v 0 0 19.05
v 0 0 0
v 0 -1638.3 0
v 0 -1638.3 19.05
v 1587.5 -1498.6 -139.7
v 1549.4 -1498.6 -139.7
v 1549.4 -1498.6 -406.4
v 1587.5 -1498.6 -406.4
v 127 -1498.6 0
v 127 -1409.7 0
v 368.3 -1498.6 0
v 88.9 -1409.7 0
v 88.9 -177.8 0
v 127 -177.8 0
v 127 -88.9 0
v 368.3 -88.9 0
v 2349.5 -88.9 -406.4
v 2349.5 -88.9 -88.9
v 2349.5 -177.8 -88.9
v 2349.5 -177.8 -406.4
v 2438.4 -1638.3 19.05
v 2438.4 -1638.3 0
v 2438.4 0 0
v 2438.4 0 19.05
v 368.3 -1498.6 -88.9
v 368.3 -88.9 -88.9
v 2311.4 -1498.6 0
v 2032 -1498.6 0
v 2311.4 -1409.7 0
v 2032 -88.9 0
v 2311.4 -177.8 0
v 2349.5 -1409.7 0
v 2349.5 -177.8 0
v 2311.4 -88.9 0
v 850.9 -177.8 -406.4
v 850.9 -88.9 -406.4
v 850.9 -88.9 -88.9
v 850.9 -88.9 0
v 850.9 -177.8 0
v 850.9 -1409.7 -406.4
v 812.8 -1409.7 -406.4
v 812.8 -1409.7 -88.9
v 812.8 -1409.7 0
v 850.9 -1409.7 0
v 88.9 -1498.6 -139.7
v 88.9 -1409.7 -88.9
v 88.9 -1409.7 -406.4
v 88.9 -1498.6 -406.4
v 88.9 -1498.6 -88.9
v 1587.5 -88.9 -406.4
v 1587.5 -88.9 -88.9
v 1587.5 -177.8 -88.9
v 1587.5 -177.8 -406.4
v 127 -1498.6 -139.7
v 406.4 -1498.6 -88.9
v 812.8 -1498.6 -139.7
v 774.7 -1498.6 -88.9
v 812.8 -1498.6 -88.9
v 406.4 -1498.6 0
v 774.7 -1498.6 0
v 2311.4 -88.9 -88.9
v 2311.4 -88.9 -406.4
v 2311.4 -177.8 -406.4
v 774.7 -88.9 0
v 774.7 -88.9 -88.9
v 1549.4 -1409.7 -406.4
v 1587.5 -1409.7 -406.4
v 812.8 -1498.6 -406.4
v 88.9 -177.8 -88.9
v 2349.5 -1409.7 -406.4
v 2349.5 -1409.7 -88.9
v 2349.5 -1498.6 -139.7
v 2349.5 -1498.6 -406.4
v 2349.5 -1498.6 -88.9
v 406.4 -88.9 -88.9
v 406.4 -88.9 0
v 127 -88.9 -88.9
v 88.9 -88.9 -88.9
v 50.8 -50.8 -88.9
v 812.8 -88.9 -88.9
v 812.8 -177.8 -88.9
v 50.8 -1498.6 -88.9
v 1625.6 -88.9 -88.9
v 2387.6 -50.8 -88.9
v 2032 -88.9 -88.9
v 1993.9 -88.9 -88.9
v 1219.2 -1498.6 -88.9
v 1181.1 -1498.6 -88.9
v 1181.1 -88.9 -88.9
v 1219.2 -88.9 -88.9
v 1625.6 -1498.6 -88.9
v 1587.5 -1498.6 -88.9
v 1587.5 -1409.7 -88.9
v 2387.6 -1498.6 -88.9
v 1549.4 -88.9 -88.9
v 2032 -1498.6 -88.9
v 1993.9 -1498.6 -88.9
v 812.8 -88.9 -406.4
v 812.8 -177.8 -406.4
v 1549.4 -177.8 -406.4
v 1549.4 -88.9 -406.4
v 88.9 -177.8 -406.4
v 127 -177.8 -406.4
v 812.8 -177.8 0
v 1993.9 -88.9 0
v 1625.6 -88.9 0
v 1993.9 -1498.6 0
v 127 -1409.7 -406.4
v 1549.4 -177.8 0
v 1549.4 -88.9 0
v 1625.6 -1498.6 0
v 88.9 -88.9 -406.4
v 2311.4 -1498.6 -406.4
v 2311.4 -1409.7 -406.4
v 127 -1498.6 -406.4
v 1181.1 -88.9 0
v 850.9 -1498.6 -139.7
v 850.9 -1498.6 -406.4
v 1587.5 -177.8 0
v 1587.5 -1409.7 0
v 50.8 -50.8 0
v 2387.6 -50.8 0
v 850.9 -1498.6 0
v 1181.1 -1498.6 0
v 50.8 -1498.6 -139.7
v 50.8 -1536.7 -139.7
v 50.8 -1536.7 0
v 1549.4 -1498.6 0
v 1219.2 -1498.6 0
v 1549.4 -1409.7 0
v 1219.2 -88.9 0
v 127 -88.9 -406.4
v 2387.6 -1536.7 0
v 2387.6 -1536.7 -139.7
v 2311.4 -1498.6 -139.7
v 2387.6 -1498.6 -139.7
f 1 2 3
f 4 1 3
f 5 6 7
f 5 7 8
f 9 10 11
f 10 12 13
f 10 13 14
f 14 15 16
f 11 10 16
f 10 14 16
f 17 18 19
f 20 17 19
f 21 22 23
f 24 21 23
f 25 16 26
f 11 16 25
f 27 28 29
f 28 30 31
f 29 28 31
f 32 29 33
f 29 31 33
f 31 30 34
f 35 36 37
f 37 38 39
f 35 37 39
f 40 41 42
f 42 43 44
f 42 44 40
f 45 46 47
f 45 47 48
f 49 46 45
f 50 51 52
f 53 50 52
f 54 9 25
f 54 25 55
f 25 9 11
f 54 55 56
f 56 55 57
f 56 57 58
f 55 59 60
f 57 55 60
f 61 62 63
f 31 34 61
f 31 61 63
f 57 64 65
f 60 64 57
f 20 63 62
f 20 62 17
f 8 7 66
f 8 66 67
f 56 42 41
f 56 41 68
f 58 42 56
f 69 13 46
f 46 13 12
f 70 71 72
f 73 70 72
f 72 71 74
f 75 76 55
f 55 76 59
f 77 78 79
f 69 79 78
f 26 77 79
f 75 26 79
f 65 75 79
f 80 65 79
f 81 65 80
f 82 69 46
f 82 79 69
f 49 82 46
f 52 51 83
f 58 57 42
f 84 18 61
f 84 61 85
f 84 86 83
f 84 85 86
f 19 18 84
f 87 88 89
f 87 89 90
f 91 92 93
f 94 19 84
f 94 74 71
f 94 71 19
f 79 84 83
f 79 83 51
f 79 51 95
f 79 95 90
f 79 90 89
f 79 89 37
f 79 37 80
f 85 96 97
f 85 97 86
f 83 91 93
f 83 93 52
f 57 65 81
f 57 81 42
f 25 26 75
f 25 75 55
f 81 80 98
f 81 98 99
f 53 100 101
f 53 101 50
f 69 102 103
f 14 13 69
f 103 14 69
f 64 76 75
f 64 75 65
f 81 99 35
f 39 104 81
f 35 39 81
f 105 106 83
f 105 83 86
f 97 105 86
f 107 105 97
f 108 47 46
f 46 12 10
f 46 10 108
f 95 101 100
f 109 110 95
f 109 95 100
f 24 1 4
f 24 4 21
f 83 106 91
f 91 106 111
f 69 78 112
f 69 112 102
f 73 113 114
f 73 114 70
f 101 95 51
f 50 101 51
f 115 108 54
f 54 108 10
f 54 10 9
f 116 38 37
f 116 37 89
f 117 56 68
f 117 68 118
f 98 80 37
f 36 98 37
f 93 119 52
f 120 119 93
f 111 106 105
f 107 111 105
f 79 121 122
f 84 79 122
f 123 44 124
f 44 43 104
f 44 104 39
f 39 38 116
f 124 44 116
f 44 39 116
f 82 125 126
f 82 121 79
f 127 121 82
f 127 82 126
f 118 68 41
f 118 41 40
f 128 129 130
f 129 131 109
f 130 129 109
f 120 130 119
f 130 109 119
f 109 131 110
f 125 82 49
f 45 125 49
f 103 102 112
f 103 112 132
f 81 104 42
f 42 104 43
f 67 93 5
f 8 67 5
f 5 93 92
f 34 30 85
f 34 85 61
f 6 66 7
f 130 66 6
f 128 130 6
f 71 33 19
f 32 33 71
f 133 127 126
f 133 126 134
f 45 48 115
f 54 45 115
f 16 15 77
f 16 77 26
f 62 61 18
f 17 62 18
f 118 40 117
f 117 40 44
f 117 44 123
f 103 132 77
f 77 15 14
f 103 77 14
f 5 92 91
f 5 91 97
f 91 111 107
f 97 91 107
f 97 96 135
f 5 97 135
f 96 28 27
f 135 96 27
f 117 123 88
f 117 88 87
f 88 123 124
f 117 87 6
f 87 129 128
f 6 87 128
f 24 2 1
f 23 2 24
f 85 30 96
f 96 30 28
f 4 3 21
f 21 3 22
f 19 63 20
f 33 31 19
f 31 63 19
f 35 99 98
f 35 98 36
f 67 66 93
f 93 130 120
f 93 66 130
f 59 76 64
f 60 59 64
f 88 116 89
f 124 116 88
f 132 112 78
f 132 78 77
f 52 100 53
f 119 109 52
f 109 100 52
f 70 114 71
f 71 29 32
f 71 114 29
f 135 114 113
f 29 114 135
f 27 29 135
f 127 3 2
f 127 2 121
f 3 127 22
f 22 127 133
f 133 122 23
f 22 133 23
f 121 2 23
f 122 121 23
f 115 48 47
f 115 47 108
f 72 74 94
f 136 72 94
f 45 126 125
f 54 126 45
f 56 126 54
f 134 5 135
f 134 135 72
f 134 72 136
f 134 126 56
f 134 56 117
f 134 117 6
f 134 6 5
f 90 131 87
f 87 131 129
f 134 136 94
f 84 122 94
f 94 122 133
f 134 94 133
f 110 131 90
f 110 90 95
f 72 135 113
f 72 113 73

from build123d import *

# Parameters (mm, degrees)
F0_W     = 2438.4
F0_H     = 914.4
F0_H_2   = 723.9
F1_DEPTH = 19.05
F2_W     = 2336.8
F2_H     = 1485.9
F2_W_2   = 279.4
F2_H_2   = 1409.7
F2_W_3   = 368.3
F2_W_4   = 317.5
F3_DEPTH = 88.9
F4_W     = 2336.8
F4_H     = 38.1
F5_DEPTH = 50.8
F6_W     = 38.1
F6_H     = 88.9
F7_DEPTH = 406.4


with BuildPart() as f1:
    # F0 (on Top) → F1 (new body)
    with BuildSketch(Plane.XY):
        with Locations((1219.2, -457.2)):
            Rectangle(F0_W, F0_H)
        with Locations((1219.2, -1276.35)):
            Rectangle(F0_W, F0_H_2)
    extrude(amount=F1_DEPTH)

    # F2 (on face) → F3 (join)
    with BuildSketch(Plane(origin=(0, 0, 0), x_dir=(1, 0, 0), z_dir=(0, 0, -1))):
        with Locations((1219.2, 793.75)):
            Rectangle(F2_W, F2_H)
        with Locations((228.6, 793.75)):
            Rectangle(F2_W_2, F2_H_2, mode=Mode.SUBTRACT)
        with Locations((590.55, 793.75)):
            Rectangle(F2_W_3, F2_H_2, mode=Mode.SUBTRACT)
        with Locations((996.95, 793.75)):
            Rectangle(F2_W_3, F2_H_2, mode=Mode.SUBTRACT)
        with Locations((1403.35, 793.75)):
            Rectangle(F2_W_3, F2_H_2, mode=Mode.SUBTRACT)
        with Locations((1809.75, 793.75)):
            Rectangle(F2_W_3, F2_H_2, mode=Mode.SUBTRACT)
        with Locations((2190.75, 793.75)):
            Rectangle(F2_W_4, F2_H_2, mode=Mode.SUBTRACT)
    extrude(amount=F3_DEPTH)

    # F4 (on face) → F5 (join)
    with BuildSketch(Plane(origin=(0, 0, -88.9), x_dir=(1, 0, 0), z_dir=(0, 0, -1))):
        with Locations((1219.2, 1517.65)):
            Rectangle(F4_W, F4_H)
    extrude(amount=F5_DEPTH)

    # F6 (on face) → F7 (join)
    with BuildSketch(Plane(origin=(0, 0, 0), x_dir=(1, 0, 0), z_dir=(0, 0, -1))):
        with Locations((107.95, 133.35)):
            Rectangle(F6_W, F6_H)
        with Locations((2330.45, 133.35)):
            Rectangle(F6_W, F6_H)
        with Locations((2330.45, 1454.15)):
            Rectangle(F6_W, F6_H)
        with Locations((107.95, 1454.15)):
            Rectangle(F6_W, F6_H)
        with Locations((831.85, 133.35)):
            Rectangle(F6_W, F6_H)
        with Locations((1568.45, 133.35)):
            Rectangle(F6_W, F6_H)
        with Locations((1568.45, 1454.15)):
            Rectangle(F6_W, F6_H)
        with Locations((831.85, 1454.15)):
            Rectangle(F6_W, F6_H)
    extrude(amount=F7_DEPTH)


solid = f1.part
